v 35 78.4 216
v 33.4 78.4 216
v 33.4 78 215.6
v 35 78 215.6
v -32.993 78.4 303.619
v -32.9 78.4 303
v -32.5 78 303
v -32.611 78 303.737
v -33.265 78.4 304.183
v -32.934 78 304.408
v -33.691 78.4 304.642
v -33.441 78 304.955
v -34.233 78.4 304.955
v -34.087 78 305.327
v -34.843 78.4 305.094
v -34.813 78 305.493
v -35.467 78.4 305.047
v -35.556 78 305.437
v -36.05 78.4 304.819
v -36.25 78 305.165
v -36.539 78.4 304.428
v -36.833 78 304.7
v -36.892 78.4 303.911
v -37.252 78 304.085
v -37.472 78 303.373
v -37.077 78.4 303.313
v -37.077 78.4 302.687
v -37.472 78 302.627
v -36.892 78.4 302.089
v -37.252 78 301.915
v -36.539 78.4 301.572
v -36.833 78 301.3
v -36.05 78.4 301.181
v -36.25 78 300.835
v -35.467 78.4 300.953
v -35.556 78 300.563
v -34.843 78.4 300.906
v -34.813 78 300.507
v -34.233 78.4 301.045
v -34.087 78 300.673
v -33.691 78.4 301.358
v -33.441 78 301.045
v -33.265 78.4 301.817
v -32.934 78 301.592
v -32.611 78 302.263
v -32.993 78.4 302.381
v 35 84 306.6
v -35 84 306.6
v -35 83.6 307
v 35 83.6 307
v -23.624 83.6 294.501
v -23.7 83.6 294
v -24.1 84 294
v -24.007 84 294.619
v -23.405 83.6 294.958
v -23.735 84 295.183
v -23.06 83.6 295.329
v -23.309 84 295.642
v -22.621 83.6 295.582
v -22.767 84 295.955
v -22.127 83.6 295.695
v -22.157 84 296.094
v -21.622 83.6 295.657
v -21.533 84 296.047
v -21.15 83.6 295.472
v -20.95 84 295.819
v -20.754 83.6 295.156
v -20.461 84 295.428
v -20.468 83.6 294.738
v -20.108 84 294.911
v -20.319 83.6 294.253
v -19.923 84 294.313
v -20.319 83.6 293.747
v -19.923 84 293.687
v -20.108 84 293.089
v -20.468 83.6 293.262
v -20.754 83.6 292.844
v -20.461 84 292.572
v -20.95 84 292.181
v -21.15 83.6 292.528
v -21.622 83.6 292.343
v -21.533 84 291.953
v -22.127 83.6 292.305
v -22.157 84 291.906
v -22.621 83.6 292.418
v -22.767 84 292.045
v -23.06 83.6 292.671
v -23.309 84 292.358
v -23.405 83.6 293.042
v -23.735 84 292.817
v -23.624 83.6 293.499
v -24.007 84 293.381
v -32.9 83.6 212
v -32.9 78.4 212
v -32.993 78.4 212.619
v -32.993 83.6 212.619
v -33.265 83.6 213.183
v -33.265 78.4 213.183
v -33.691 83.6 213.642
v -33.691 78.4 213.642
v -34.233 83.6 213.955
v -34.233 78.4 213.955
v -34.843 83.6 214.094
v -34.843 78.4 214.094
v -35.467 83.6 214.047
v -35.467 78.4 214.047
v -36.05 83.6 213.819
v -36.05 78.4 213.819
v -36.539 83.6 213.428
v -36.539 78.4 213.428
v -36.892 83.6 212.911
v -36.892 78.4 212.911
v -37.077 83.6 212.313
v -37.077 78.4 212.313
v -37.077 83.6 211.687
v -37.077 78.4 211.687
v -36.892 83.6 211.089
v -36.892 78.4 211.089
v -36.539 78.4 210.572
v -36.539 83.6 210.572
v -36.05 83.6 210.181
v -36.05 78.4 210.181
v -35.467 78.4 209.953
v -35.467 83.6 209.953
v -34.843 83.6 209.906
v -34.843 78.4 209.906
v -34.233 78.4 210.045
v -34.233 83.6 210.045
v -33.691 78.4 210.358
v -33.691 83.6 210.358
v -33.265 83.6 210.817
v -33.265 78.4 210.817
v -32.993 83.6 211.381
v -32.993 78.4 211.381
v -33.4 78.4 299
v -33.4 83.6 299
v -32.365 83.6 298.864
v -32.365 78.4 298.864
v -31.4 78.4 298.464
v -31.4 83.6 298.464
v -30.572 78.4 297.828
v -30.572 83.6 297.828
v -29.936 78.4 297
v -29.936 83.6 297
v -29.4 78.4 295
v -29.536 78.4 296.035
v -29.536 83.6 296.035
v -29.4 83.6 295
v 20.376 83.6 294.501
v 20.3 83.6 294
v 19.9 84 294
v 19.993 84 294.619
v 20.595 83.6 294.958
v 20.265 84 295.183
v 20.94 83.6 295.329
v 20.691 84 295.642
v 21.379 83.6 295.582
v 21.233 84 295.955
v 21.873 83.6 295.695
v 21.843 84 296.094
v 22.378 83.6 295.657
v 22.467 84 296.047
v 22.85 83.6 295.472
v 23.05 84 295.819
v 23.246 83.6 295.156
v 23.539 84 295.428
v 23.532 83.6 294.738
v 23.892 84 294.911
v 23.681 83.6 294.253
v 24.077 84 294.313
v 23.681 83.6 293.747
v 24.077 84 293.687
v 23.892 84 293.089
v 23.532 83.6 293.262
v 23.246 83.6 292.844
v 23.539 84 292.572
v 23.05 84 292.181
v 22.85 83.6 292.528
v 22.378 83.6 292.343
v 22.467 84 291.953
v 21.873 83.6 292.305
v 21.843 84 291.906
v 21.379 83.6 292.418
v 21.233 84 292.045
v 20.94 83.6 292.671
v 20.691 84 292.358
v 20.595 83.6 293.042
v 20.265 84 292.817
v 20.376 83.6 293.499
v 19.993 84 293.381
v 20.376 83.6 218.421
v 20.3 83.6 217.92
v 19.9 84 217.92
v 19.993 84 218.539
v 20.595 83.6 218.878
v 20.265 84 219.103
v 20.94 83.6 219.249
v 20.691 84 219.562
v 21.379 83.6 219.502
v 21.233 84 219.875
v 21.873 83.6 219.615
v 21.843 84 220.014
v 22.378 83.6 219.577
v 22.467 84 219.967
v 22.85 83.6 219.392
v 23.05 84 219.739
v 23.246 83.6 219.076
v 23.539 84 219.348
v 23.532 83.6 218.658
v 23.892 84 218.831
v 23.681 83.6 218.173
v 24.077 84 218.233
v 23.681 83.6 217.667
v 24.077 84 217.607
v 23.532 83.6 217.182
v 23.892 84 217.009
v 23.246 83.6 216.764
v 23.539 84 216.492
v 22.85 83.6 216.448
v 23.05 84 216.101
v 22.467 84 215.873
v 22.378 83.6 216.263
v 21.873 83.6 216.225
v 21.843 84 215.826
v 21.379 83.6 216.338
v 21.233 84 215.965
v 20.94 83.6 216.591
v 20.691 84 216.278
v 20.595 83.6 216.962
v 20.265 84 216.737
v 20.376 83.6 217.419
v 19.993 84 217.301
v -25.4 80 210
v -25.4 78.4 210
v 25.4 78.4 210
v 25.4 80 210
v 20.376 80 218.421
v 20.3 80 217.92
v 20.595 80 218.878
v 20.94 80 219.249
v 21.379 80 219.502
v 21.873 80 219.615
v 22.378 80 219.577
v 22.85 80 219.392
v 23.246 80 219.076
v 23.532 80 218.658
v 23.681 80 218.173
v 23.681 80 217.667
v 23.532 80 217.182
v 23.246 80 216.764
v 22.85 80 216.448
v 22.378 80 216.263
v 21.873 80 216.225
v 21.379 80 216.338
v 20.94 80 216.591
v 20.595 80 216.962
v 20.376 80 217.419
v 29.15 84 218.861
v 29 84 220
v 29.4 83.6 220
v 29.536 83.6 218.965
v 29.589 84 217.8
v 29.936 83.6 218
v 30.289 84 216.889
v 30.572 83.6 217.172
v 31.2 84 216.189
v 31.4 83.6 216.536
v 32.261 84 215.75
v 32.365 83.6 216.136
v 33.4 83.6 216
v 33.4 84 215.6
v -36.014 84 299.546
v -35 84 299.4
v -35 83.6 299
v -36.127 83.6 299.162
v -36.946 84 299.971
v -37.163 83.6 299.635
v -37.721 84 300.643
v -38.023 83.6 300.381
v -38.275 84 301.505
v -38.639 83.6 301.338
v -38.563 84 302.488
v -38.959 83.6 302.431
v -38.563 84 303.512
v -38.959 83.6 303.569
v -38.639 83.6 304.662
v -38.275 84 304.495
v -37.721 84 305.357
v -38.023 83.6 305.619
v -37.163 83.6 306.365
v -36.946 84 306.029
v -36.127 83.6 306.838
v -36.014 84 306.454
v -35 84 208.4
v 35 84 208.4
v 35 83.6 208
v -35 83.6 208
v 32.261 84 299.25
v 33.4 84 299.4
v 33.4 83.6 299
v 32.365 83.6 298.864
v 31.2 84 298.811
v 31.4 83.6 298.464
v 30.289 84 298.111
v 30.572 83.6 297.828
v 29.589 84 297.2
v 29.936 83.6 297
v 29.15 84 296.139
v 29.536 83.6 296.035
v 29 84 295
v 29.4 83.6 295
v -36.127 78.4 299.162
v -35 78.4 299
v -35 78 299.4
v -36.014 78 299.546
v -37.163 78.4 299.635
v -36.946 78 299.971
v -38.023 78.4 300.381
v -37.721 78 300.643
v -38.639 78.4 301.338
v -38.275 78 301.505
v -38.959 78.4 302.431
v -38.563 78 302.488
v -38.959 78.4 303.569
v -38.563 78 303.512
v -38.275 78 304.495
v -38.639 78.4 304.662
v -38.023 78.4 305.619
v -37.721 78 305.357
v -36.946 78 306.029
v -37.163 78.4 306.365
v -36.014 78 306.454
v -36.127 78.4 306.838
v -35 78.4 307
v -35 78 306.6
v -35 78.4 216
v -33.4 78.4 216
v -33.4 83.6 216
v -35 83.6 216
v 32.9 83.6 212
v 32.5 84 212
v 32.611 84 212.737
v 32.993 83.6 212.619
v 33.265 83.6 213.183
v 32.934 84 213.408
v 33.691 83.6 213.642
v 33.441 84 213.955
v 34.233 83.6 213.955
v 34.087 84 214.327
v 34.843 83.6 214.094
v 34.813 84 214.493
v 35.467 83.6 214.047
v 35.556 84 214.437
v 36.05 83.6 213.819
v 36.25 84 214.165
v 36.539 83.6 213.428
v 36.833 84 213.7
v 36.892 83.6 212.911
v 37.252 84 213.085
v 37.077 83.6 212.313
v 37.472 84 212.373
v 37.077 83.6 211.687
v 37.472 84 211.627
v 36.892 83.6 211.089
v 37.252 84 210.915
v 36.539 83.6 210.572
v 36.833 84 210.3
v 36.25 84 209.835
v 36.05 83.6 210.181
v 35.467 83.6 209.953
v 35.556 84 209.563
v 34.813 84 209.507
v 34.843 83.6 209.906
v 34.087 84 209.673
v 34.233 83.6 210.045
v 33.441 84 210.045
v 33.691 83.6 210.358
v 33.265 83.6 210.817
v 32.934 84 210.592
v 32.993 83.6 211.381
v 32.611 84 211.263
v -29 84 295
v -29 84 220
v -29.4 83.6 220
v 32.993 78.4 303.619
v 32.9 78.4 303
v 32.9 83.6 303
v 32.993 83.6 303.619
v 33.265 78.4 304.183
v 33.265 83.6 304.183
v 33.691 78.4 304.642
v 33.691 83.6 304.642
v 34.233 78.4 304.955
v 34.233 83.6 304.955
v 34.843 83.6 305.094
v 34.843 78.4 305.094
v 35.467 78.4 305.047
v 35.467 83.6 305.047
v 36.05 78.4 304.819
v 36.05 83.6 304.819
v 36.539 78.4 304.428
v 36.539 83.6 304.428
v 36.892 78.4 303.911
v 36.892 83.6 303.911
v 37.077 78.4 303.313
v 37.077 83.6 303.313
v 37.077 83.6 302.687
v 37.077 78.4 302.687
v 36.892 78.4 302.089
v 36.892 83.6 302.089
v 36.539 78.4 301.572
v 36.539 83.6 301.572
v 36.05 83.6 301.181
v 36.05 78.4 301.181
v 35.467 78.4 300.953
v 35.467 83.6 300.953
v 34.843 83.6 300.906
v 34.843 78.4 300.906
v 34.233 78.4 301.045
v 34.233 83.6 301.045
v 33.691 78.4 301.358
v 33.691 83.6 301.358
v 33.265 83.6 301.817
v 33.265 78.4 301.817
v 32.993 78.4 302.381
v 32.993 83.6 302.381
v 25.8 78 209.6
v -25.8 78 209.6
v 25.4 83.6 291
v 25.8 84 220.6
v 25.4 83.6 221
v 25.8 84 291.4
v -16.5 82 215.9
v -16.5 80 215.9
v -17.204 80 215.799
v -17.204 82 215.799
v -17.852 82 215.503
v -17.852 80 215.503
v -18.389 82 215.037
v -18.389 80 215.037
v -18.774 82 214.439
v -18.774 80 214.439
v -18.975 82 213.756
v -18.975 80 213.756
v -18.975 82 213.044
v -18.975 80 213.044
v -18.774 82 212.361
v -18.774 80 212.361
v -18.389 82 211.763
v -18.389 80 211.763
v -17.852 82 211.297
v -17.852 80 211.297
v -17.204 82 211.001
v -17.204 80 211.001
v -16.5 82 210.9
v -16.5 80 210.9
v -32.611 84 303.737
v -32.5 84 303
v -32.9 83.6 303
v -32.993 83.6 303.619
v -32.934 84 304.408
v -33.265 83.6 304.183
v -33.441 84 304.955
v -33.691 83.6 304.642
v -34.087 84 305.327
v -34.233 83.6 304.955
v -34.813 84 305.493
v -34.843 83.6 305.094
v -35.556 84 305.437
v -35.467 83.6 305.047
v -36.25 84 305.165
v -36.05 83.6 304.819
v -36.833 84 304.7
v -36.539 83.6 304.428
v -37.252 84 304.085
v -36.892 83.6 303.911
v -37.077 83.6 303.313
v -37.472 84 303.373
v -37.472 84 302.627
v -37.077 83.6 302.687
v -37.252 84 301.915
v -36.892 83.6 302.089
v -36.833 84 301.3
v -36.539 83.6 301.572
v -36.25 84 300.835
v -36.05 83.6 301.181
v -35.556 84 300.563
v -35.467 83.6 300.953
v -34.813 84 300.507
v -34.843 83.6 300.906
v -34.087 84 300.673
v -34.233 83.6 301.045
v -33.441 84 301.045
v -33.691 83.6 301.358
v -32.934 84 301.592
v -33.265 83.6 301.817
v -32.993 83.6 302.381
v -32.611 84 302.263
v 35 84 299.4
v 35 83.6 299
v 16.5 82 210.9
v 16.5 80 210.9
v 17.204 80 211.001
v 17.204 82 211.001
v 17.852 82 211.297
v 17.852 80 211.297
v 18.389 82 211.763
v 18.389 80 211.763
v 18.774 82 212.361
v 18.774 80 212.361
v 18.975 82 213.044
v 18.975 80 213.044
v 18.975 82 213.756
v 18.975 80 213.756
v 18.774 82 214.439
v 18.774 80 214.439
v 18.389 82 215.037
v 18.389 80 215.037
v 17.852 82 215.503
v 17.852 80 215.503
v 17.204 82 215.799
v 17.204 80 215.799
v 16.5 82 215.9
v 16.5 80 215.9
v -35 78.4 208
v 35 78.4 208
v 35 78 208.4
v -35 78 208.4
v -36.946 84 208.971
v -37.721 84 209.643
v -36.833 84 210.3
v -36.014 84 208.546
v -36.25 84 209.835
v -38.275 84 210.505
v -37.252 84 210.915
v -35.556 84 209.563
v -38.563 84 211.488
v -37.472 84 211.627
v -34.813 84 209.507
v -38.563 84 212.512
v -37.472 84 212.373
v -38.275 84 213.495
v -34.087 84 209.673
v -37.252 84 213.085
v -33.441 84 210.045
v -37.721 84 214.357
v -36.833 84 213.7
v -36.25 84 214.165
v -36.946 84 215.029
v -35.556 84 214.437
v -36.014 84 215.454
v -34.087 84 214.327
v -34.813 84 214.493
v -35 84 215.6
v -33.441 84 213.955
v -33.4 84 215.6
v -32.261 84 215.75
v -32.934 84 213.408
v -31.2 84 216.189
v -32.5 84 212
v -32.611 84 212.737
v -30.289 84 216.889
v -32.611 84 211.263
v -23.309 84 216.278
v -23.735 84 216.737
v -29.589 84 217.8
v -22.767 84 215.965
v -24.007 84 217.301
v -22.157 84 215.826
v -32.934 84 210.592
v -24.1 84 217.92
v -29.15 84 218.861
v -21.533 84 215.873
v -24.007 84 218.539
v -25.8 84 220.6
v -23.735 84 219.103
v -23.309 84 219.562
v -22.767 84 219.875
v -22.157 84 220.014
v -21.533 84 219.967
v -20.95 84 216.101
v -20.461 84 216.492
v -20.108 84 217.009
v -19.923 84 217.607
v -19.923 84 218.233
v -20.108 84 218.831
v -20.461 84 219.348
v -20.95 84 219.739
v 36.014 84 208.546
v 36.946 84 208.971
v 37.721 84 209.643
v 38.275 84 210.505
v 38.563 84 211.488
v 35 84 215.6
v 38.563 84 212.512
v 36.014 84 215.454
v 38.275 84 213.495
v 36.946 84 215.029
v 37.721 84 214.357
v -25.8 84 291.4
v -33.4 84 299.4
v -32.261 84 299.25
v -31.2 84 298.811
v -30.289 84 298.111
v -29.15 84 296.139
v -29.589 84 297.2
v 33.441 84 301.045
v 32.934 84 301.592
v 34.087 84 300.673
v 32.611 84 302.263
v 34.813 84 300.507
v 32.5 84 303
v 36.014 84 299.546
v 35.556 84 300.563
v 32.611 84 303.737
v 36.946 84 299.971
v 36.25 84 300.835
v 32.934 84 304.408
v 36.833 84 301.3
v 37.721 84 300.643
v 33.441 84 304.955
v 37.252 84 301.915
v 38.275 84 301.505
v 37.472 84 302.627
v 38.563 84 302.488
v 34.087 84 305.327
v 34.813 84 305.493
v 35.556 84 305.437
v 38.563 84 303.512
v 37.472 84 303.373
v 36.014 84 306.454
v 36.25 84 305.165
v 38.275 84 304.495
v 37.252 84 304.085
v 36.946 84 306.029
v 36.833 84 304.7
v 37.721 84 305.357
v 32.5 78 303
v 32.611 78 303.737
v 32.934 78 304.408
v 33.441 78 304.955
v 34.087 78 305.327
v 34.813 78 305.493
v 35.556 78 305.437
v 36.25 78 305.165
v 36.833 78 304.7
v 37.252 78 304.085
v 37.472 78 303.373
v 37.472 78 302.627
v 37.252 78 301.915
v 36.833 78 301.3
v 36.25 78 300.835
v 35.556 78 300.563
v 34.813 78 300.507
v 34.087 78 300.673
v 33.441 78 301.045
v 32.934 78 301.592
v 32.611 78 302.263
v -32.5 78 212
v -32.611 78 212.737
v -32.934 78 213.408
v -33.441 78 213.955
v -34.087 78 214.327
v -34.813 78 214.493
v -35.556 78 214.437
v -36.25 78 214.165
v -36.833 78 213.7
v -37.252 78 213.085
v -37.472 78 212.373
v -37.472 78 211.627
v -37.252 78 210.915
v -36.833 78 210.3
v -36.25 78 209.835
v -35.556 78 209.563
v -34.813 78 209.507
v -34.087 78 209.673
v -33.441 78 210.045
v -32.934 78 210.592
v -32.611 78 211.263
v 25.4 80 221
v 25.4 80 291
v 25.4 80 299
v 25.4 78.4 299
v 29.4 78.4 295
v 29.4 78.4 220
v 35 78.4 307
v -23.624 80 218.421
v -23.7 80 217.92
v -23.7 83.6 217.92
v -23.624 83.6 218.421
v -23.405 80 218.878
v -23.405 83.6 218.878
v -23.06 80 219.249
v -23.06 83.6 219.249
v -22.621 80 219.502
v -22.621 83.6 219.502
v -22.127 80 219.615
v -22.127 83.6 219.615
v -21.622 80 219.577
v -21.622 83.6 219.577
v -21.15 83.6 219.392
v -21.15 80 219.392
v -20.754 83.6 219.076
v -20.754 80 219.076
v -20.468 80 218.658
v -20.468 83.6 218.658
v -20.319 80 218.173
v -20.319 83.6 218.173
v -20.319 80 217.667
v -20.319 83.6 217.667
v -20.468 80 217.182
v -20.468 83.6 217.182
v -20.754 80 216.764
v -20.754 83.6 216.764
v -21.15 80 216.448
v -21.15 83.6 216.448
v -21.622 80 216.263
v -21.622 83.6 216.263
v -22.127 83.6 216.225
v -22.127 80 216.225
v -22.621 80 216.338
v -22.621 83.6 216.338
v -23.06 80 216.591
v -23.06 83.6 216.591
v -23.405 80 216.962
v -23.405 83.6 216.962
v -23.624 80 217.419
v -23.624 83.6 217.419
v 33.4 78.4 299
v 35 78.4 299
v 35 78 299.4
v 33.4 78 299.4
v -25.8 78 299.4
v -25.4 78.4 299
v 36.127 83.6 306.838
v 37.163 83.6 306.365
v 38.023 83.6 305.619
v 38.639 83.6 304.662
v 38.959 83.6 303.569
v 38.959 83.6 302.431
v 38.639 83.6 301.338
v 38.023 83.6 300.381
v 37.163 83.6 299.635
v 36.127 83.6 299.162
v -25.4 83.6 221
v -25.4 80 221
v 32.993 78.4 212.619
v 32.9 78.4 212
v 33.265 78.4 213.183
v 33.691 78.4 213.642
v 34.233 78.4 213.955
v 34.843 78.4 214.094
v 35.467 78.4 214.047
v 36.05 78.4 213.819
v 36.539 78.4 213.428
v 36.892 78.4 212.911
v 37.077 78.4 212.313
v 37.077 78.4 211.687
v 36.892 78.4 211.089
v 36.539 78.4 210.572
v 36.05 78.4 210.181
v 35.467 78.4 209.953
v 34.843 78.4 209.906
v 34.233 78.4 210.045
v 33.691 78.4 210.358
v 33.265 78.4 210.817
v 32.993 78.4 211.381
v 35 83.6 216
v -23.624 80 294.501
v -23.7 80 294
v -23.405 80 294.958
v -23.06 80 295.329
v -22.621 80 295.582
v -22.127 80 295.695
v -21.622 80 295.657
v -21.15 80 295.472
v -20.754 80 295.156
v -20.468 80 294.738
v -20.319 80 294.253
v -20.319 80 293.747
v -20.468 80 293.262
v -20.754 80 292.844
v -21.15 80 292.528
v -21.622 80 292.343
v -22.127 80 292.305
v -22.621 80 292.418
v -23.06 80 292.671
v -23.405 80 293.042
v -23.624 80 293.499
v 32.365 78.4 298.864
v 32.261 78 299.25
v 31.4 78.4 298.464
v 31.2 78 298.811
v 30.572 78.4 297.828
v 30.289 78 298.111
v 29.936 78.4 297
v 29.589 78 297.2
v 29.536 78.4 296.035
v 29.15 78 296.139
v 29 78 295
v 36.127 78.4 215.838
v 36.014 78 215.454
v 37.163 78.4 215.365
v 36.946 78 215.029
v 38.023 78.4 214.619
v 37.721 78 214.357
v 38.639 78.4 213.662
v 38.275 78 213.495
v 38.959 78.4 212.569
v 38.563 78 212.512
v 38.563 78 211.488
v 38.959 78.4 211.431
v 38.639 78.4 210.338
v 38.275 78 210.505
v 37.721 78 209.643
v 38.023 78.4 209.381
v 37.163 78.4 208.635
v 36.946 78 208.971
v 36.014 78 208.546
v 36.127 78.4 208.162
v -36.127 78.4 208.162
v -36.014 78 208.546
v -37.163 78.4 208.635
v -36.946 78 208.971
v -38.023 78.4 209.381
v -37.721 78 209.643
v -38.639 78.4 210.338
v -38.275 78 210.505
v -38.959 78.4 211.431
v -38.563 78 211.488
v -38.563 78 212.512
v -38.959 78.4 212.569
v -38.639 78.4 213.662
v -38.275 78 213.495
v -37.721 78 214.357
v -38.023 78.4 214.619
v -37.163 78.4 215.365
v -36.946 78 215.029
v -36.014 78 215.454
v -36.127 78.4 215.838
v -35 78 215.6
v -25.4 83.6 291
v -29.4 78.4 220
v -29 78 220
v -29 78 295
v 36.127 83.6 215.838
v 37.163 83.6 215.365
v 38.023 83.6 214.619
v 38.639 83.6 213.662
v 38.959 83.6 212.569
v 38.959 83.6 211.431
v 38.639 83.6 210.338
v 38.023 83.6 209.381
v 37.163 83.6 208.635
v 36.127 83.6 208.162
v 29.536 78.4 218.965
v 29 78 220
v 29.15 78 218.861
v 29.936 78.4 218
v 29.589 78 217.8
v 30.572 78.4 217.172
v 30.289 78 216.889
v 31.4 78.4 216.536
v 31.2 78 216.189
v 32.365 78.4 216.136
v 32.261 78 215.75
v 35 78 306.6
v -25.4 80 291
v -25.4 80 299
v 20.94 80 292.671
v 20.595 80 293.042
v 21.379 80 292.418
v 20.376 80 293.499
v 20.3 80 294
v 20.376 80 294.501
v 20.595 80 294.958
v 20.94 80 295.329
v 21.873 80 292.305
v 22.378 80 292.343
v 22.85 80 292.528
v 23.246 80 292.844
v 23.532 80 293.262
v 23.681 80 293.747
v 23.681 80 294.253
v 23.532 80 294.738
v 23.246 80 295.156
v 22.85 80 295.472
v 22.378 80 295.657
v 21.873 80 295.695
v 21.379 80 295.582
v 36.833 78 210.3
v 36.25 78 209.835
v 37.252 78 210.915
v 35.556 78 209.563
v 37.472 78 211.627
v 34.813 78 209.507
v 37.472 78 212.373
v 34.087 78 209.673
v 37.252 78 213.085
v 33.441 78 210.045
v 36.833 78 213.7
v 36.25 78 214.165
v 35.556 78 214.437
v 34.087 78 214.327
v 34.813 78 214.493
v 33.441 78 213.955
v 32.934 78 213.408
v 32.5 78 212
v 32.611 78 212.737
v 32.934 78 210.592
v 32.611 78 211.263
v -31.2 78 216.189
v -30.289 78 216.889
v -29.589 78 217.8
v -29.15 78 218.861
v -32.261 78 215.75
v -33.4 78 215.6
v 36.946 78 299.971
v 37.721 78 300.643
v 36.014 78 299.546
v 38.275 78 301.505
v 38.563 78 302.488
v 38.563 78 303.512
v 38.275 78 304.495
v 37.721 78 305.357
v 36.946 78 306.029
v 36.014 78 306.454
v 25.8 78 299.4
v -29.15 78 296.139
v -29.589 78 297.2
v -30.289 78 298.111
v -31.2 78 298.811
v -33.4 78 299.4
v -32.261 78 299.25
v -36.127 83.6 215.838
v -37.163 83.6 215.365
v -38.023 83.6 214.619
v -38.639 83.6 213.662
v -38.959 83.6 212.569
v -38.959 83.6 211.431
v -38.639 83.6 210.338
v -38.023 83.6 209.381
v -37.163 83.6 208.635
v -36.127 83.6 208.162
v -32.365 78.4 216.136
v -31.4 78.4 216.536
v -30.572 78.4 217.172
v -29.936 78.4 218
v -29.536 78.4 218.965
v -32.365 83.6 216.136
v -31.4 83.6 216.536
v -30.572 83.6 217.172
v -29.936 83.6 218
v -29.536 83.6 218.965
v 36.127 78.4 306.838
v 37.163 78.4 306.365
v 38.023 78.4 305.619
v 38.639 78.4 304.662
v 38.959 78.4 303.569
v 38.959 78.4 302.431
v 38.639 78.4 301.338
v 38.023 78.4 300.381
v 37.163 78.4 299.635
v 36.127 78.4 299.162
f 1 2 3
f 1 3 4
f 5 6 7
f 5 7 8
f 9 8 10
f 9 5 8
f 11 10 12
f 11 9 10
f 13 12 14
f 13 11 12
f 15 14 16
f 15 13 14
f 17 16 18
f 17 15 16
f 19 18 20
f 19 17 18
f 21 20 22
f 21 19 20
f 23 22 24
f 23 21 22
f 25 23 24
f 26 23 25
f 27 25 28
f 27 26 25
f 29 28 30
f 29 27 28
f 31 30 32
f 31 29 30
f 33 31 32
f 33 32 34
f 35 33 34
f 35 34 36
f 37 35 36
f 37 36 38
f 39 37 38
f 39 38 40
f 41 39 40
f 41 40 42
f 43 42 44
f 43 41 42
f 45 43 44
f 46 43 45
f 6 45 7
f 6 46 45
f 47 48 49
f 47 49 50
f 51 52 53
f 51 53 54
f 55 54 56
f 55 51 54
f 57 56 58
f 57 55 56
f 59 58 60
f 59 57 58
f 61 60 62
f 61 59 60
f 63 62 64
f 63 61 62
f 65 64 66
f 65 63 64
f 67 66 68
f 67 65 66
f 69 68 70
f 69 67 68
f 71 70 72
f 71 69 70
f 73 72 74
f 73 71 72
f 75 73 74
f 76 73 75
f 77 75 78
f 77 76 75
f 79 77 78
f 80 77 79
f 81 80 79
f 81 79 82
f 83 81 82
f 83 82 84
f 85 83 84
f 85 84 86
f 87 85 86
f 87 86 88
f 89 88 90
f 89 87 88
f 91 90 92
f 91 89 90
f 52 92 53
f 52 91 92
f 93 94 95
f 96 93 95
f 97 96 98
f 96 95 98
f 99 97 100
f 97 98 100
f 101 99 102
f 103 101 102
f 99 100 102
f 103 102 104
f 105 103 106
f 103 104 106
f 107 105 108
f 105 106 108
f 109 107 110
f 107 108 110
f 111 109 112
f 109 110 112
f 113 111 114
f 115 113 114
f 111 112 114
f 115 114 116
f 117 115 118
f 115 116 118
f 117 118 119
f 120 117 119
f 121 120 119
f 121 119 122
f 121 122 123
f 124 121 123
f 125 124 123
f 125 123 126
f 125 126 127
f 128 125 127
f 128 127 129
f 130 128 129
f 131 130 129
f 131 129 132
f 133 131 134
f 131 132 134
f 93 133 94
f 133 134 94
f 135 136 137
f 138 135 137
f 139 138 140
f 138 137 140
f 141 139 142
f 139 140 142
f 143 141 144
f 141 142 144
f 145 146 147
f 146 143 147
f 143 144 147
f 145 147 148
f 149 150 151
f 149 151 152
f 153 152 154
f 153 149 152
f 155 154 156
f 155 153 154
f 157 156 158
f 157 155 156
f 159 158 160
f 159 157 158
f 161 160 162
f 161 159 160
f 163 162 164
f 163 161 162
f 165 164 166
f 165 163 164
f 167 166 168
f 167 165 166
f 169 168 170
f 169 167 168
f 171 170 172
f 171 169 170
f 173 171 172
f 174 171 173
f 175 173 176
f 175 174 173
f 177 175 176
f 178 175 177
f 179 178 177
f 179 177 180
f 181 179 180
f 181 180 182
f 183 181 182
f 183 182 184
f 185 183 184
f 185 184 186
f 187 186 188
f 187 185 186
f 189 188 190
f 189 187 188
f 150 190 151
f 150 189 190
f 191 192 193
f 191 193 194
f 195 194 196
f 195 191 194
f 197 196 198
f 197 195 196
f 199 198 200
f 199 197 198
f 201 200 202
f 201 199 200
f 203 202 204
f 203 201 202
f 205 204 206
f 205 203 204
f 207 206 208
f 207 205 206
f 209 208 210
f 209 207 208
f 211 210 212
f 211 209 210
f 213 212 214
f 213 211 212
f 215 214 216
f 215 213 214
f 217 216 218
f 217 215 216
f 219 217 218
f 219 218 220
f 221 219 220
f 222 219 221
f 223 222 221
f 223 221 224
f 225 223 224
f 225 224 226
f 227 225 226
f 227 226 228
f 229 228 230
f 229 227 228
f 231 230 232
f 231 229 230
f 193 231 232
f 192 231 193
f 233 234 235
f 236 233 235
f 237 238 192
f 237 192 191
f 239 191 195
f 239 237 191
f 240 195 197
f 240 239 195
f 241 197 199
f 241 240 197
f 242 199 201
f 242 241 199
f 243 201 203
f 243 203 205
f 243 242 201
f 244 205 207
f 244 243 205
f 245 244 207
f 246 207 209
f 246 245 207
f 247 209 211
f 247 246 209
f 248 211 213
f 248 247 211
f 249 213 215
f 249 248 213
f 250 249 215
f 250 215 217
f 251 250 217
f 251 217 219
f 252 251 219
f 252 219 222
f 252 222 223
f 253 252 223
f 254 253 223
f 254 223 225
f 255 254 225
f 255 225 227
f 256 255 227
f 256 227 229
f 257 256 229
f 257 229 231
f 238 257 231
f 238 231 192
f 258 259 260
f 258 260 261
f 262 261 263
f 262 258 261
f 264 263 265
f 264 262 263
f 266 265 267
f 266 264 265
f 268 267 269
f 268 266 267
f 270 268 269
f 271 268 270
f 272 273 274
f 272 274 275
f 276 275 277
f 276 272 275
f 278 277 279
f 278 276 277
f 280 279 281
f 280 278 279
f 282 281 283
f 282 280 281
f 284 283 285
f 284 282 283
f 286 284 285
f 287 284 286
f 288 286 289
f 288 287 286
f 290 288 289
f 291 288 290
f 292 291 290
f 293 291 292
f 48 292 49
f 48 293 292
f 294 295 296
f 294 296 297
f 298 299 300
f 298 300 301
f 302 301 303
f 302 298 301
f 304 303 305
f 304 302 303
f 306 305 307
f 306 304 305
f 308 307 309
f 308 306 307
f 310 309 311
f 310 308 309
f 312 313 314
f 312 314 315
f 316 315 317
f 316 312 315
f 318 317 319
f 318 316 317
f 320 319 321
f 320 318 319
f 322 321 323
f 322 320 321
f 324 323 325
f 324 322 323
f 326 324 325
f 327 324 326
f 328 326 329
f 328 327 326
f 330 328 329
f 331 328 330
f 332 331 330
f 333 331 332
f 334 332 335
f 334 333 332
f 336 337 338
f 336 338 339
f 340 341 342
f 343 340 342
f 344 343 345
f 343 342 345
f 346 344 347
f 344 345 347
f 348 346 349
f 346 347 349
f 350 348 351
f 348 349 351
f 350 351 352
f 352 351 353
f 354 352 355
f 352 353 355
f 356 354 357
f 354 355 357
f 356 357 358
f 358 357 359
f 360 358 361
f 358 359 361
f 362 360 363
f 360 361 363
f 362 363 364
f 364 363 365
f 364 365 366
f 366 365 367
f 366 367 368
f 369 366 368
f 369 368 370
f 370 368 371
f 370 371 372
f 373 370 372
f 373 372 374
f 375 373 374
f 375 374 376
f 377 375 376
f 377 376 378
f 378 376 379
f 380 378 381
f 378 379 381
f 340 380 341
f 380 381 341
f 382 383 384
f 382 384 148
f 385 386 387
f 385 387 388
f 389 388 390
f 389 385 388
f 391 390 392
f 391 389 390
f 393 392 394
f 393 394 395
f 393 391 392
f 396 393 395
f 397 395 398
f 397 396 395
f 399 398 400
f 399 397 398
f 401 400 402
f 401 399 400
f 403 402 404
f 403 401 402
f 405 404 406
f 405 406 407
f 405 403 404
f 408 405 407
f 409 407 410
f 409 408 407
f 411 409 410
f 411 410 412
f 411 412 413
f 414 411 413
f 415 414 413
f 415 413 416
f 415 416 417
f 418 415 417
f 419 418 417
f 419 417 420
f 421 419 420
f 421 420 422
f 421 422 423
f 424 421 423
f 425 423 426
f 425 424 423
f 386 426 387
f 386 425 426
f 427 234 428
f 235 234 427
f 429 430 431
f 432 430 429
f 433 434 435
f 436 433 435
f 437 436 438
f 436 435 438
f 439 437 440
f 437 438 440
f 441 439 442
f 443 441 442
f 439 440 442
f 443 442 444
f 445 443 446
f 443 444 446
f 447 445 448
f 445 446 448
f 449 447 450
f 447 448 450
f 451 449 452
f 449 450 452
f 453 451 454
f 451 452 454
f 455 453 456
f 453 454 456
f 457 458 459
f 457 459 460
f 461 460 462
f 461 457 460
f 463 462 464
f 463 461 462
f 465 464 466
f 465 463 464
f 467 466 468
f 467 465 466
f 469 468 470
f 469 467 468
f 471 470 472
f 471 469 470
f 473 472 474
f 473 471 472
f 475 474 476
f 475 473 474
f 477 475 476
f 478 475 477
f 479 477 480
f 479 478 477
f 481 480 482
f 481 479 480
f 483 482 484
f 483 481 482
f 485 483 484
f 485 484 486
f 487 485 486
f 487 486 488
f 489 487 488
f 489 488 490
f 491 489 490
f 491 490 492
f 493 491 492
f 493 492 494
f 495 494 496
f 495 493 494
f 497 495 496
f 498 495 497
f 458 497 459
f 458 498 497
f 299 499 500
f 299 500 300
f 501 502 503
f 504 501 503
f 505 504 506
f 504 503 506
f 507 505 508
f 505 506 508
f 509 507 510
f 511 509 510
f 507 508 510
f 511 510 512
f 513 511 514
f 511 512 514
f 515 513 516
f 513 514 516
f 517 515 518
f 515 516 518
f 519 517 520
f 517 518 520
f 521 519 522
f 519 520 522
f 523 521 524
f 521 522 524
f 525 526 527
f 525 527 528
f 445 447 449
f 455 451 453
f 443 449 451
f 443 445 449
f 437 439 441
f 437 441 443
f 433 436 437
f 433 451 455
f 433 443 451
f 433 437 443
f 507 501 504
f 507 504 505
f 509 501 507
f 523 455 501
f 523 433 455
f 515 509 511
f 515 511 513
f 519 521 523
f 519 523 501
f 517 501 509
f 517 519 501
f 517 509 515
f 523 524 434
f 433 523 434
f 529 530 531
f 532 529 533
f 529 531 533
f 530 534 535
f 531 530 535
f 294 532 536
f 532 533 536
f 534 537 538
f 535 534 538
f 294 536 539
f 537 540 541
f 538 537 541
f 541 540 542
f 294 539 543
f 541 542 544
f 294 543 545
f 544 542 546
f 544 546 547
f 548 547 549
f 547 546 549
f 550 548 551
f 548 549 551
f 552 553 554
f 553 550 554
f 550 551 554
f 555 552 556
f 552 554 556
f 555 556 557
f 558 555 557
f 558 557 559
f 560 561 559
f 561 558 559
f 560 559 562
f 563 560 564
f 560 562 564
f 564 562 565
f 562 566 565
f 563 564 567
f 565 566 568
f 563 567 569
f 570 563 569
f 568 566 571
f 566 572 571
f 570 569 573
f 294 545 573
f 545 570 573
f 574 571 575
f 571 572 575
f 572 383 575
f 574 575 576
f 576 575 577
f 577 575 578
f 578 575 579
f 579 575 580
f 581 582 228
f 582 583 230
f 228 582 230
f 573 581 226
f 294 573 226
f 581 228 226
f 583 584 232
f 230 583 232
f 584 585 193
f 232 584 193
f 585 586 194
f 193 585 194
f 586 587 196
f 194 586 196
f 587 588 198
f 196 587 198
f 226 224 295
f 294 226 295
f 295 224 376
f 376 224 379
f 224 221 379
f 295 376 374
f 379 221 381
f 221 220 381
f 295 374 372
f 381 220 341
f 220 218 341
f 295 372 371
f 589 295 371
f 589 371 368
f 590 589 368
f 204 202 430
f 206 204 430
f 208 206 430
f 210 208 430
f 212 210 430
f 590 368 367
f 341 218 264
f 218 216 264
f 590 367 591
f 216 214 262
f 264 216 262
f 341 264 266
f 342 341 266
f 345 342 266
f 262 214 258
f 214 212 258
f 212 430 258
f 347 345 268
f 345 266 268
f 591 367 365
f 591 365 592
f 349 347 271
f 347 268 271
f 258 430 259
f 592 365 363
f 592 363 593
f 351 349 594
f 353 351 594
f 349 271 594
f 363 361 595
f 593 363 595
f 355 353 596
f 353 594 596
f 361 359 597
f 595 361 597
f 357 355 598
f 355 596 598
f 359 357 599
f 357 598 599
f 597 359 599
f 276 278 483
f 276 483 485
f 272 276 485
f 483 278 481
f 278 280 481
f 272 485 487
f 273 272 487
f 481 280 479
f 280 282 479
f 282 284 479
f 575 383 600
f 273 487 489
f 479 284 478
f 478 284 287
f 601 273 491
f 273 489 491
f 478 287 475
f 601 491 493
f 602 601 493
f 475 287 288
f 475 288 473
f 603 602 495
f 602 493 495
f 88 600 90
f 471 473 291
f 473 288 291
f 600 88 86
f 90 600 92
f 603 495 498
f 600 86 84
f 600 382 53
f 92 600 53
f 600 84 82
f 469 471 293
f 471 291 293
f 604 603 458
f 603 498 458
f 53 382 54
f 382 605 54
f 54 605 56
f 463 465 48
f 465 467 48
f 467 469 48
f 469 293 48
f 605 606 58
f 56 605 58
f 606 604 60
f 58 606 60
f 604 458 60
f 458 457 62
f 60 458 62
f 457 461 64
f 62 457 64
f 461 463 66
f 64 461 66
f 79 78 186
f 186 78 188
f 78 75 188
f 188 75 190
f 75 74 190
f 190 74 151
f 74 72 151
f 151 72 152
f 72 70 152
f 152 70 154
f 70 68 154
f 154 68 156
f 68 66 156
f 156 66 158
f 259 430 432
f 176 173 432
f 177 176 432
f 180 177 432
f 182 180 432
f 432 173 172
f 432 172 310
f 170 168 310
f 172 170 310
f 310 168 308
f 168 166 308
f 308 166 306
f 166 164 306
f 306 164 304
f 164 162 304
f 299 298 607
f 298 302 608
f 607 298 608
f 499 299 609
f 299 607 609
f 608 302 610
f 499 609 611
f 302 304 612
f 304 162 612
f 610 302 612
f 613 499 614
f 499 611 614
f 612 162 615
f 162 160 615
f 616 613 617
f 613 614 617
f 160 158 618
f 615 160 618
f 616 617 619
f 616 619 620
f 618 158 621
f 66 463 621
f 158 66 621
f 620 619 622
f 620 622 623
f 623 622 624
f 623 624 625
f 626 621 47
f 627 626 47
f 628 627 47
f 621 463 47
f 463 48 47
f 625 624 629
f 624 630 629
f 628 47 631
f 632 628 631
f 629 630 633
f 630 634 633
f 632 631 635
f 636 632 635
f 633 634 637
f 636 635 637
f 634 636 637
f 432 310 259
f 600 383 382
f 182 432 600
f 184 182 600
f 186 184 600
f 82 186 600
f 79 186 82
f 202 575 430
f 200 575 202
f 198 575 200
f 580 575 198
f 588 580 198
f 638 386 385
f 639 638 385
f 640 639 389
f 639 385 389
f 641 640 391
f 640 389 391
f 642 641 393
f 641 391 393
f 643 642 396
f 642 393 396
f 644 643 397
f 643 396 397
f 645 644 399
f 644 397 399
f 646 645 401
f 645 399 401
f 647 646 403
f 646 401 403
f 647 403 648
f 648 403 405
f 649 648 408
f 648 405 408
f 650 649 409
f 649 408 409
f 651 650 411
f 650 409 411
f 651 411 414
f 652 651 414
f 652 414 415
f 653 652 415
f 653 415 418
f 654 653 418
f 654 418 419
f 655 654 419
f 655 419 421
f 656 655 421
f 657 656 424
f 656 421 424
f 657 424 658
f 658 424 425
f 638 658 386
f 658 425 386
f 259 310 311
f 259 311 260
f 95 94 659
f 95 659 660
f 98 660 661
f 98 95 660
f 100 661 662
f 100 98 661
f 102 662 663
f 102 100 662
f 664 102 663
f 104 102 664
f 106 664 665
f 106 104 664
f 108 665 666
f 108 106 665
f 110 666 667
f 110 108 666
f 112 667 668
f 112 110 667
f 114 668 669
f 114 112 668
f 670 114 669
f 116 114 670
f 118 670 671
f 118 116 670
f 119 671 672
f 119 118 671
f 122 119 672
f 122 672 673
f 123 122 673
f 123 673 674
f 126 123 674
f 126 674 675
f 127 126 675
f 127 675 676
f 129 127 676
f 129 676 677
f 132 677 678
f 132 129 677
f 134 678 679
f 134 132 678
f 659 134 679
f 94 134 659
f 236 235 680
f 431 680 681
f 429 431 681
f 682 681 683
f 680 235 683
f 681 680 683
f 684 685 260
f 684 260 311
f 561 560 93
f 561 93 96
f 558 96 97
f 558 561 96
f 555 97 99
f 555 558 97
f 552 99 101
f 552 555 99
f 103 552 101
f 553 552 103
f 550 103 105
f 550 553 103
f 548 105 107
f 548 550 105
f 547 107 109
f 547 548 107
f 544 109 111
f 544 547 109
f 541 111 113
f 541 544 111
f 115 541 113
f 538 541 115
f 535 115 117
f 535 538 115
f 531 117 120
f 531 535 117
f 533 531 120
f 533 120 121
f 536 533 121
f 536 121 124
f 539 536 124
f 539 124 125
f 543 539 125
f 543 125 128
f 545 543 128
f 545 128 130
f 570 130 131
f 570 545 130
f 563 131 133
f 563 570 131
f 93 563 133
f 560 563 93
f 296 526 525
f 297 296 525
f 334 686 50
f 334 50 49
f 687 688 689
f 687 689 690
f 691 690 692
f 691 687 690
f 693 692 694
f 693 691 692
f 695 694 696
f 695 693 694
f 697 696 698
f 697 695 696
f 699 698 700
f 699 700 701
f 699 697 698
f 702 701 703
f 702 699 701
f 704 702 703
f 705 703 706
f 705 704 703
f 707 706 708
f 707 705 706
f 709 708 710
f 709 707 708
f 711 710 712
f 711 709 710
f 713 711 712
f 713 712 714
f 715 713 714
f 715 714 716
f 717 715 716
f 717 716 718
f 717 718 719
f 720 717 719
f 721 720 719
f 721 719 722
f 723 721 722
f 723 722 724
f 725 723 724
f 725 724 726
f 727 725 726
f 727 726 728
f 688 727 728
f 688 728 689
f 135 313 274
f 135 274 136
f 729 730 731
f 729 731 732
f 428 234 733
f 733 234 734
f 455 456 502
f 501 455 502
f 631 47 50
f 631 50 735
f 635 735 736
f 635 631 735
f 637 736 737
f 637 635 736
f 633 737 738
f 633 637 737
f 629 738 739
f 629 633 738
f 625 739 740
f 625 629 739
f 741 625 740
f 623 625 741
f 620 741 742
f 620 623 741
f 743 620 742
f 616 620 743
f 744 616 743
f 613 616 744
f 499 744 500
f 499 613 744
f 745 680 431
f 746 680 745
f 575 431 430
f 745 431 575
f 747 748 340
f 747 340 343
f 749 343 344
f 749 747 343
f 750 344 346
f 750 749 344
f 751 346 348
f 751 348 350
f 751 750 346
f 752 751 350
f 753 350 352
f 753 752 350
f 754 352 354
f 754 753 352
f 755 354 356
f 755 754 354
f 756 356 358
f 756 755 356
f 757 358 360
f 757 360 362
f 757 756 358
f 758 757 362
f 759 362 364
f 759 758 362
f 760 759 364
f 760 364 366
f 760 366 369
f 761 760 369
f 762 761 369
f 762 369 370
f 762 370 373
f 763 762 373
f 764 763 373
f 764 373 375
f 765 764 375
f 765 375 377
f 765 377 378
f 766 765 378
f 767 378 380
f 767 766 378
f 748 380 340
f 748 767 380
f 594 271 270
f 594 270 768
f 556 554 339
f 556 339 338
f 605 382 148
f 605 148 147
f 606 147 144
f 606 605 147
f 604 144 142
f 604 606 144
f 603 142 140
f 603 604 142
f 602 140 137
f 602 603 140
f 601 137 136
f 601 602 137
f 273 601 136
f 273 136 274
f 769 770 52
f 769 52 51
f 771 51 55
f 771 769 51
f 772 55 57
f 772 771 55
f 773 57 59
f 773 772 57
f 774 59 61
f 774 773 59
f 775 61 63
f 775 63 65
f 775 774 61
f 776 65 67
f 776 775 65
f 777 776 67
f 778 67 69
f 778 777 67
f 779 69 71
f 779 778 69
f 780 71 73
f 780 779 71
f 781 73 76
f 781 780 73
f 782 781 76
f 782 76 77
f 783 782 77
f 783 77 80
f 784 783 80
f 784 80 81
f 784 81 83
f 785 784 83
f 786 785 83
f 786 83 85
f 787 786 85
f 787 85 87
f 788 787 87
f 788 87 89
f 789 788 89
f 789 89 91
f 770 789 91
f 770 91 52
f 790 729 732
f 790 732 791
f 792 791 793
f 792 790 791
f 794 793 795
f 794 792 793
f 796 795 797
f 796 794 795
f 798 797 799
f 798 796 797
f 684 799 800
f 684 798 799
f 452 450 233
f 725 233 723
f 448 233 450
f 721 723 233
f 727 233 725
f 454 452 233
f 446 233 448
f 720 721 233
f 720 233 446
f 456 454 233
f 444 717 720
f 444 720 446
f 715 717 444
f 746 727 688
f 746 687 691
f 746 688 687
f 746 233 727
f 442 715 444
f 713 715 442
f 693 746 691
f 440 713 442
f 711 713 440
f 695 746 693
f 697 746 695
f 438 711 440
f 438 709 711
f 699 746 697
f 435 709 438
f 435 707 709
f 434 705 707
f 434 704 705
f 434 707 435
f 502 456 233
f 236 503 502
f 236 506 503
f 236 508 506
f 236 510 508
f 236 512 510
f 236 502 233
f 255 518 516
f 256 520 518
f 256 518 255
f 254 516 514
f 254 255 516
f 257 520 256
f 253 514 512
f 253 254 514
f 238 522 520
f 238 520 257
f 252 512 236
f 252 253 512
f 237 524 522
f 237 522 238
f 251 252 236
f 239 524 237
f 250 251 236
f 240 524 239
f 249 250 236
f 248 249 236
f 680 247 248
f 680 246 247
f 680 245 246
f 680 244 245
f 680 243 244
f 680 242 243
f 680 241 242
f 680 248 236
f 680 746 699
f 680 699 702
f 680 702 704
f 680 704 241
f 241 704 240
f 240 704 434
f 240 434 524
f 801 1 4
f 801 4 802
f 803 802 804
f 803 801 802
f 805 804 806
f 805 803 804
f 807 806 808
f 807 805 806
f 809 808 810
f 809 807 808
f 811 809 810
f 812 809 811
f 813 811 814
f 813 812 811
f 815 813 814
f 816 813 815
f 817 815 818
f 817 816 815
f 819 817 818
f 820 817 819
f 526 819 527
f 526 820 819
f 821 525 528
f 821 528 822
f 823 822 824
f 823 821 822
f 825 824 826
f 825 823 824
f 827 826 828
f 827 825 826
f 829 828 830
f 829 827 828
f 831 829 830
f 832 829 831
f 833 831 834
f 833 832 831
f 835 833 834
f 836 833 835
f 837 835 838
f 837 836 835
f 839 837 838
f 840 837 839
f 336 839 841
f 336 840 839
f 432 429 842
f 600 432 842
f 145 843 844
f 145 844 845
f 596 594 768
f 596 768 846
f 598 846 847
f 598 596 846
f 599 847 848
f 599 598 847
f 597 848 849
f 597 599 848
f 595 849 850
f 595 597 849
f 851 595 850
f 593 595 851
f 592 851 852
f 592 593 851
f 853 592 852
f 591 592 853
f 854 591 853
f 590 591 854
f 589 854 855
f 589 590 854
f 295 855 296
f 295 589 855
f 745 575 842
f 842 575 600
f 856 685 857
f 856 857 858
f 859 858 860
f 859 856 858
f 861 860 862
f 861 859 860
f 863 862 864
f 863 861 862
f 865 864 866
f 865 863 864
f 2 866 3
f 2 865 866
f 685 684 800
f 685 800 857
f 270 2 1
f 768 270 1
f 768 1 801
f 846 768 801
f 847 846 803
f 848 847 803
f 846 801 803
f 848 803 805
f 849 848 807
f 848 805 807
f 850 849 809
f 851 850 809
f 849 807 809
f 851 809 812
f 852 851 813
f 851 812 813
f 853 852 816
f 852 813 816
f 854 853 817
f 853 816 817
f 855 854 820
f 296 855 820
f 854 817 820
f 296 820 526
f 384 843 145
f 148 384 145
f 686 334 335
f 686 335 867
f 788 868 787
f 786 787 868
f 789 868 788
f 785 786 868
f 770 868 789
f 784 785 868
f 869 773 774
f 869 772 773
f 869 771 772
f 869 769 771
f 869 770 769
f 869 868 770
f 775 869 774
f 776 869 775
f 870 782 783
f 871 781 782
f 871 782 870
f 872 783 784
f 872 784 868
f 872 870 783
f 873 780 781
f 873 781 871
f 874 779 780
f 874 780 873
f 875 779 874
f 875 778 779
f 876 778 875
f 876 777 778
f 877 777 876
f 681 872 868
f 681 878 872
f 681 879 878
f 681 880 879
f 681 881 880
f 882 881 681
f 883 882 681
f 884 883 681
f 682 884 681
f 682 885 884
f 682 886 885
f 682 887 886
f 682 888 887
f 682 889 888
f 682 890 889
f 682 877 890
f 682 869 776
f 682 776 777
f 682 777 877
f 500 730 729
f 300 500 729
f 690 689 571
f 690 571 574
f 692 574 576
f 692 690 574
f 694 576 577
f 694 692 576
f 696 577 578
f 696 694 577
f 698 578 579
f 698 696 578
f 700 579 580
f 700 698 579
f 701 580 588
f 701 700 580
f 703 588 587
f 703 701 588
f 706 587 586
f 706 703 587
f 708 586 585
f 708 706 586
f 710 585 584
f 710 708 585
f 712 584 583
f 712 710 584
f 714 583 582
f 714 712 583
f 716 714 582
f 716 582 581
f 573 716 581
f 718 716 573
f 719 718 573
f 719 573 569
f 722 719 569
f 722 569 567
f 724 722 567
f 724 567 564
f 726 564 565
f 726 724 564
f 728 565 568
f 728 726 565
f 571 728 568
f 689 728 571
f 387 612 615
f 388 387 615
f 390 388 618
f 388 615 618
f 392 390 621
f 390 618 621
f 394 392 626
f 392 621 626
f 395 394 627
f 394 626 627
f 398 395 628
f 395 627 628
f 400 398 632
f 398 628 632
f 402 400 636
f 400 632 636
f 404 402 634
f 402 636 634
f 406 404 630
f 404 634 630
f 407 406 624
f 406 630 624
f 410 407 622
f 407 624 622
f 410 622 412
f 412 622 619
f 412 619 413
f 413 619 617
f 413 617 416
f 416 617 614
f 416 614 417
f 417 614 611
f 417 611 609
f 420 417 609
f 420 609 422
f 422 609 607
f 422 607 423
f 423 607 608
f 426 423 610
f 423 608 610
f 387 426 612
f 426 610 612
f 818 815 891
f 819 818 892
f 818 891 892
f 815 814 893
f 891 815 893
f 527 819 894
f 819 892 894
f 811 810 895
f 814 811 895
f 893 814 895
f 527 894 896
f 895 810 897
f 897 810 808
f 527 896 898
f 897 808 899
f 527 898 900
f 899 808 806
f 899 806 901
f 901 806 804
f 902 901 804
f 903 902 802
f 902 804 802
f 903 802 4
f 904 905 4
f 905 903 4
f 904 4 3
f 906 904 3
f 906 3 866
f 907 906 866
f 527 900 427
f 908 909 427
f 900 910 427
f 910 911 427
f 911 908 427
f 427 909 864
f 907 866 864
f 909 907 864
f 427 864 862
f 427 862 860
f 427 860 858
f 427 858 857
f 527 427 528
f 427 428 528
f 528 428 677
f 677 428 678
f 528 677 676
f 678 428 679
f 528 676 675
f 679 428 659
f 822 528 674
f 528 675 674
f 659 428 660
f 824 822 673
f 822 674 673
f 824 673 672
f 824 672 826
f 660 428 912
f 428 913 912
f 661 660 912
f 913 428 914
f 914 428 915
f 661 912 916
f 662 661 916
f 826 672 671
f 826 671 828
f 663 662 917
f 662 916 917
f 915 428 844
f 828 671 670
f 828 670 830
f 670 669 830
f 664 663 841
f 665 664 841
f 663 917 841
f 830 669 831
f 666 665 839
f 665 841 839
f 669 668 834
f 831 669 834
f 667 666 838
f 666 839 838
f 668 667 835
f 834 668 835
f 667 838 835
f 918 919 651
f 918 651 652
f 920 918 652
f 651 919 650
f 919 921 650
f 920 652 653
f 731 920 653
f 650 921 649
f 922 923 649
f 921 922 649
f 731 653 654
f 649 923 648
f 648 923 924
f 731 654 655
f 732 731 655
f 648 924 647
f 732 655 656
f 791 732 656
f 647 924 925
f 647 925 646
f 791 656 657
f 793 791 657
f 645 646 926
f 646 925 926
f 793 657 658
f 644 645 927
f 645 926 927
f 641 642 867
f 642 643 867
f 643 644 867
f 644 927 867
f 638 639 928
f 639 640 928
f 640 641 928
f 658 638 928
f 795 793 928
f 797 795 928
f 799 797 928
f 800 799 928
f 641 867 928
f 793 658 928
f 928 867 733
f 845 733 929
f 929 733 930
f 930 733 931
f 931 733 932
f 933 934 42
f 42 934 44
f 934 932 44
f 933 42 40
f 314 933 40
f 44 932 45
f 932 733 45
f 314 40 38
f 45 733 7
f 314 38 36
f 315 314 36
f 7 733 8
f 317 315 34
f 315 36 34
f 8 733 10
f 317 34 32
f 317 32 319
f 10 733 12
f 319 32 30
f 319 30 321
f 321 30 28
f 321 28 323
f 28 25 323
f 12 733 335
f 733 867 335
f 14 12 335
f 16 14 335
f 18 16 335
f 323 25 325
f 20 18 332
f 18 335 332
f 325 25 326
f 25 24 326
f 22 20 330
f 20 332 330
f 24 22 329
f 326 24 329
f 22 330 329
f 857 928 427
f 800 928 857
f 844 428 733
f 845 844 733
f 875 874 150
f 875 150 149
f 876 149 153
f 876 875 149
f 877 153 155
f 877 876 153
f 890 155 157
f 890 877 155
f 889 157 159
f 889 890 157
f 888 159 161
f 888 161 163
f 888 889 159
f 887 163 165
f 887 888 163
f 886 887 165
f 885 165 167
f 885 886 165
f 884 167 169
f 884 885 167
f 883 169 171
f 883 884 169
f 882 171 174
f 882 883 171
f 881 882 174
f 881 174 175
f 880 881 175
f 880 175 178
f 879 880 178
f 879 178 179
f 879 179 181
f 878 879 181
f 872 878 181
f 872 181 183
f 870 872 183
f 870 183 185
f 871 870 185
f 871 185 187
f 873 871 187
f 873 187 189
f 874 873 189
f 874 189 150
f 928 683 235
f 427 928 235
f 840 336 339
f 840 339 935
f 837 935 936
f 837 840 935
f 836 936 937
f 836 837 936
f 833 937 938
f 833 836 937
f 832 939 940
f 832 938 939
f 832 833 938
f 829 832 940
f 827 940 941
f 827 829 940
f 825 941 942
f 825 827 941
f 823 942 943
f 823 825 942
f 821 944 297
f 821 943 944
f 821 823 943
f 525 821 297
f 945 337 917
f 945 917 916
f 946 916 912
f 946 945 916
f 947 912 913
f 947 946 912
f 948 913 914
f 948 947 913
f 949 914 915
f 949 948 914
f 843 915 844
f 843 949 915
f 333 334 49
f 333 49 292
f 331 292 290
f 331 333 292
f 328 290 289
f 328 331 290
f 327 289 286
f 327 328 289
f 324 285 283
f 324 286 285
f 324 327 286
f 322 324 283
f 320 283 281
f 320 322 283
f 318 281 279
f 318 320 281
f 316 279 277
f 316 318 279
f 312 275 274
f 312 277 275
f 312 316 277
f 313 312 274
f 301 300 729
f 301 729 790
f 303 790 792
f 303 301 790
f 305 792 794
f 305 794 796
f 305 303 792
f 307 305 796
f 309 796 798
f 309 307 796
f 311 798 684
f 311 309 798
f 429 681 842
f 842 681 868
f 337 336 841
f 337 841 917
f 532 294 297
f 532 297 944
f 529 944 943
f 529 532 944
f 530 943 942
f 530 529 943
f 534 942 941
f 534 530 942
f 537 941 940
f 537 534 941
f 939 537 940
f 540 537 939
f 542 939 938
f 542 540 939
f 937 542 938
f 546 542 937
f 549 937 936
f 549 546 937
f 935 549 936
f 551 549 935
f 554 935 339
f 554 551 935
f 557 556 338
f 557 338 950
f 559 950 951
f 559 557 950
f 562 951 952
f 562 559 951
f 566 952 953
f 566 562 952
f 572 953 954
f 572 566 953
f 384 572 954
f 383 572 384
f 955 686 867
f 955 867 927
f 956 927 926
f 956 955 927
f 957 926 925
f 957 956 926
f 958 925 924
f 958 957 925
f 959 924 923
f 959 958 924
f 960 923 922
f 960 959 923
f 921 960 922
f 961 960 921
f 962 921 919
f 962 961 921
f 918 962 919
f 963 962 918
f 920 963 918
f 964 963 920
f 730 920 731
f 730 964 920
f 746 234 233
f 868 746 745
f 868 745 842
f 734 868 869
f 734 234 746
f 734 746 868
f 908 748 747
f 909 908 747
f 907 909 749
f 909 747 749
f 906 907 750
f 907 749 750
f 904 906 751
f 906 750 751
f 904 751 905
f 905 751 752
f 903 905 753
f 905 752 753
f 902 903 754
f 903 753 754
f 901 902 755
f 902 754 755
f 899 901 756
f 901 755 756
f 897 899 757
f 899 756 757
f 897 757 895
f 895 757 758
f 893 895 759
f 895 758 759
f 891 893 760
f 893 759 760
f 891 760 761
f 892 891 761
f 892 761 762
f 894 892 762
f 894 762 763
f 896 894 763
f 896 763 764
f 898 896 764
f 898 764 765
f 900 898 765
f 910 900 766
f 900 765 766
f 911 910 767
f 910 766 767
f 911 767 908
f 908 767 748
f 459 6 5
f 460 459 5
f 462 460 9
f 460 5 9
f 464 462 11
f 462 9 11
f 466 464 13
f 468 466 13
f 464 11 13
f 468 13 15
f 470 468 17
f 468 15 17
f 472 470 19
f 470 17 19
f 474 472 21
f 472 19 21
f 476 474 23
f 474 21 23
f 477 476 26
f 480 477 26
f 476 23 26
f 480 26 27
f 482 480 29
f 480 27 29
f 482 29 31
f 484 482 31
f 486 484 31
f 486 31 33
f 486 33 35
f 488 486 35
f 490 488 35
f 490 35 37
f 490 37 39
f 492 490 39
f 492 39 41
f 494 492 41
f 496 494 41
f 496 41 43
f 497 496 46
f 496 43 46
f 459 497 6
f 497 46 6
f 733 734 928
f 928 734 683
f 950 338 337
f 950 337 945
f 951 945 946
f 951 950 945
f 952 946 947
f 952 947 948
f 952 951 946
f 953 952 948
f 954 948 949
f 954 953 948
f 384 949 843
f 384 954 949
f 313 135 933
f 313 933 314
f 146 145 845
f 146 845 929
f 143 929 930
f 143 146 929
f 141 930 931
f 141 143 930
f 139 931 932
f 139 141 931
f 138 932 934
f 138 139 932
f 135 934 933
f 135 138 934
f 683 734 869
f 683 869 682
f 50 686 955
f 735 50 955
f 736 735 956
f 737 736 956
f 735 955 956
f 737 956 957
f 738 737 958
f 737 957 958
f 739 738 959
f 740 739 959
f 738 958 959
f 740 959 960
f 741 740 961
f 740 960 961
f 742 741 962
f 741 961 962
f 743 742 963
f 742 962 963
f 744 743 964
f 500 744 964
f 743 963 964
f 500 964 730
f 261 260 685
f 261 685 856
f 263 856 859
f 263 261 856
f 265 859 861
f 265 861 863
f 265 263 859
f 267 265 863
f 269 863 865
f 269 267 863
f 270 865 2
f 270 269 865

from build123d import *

# Parameters (mm, degrees)
SKETCH210_W     = 58.8
SKETCH210_H     = 99
SKETCH210_R     = 1.7
SKETCH210_W_2   = 50.8
SKETCH210_H_2   = 70
PAD109_DEPTH    = 6
SKETCH211_R     = 2.1
PAD110_DEPTH    = 6
SKETCH212_W     = 50.8
SKETCH212_H     = 89
POCKET044_DEPTH = 2
POCKET045_DEPTH = 2
FILLET_R        = 4
CHAMFER074_SIZE = 0.4


with BuildPart() as part:
    # Sketch210 (on Binder) → Pad109 (new body)
    with BuildSketch(Plane(origin=(0, 78, 0), x_dir=(-1, 0, 0), z_dir=(0, 1, 0))):
        with Locations((0, 257.5)):
            Rectangle(SKETCH210_W, SKETCH210_H)
        with Locations((-22, 217.92)):
            Circle(SKETCH210_R, mode=Mode.SUBTRACT)
        with Locations((22, 217.92)):
            Circle(SKETCH210_R, mode=Mode.SUBTRACT)
        with Locations((22, 294)):
            Circle(SKETCH210_R, mode=Mode.SUBTRACT)
        with Locations((-22, 294)):
            Circle(SKETCH210_R, mode=Mode.SUBTRACT)
        with Locations((0, 256)):
            Rectangle(SKETCH210_W_2, SKETCH210_H_2, mode=Mode.SUBTRACT)
    extrude(amount=PAD109_DEPTH)

    # Sketch211 (on Face13 of Pad109) → Pad110 (join)
    with BuildSketch(Plane.XZ.offset(-78)):
        with BuildLine():
            ThreePointArc((-29.4, 299), (-25.4, 303), (-29.4, 307))
            Line((-29.4, 307), (-35, 307))
            ThreePointArc((-35, 307), (-39, 303), (-35, 299))
            Line((-35, 299), (-29.4, 299))
        make_face()
        with Locations((-35, 303)):
            Circle(SKETCH211_R, mode=Mode.SUBTRACT)
        with BuildLine():
            ThreePointArc((-29.4, 208), (-25.4, 212), (-29.4, 216))
            Line((-29.4, 216), (-35, 216))
            ThreePointArc((-35, 216), (-39, 212), (-35, 208))
            Line((-35, 208), (-29.4, 208))
        make_face()
        with Locations((-35, 212)):
            Circle(SKETCH211_R, mode=Mode.SUBTRACT)
    pad110 = extrude(amount=-PAD110_DEPTH)

    # Mirrored: Pad110 across YZ
    add(pad110.mirror(Plane.YZ))

    # Sketch212 (on Face6 of Mirrored) → Pocket044 (cut)
    with BuildSketch(Plane.XZ.offset(-78)):
        with Locations((0, 254.5)):
            Rectangle(SKETCH212_W, SKETCH212_H)
    extrude(amount=-POCKET044_DEPTH, mode=Mode.SUBTRACT)

    # Sketch213 (on Face28 of Pocket044) → Pocket045 (cut)
    with BuildSketch(Plane.XZ.offset(-80)):
        with BuildLine():
            ThreePointArc((-16.5, 215.9), (-19, 213.4), (-16.5, 210.9))
            Line((-16.5, 210.9), (16.5, 210.9))
            ThreePointArc((16.5, 210.9), (19, 213.4), (16.5, 215.9))
            Line((16.5, 215.9), (-16.5, 215.9))
        make_face()
    extrude(amount=-POCKET045_DEPTH, mode=Mode.SUBTRACT)

    # Fillet
    fillet_edges = [part.edges().sort_by_distance(p)[0] for p in [
        (-29.4, 81, 216),
        (-29.4, 81, 299),
        (29.4, 81, 299),
        (29.4, 81, 216),
    ]]
    fillet(fillet_edges, radius=FILLET_R)

    # Chamfer074
    chamfer074_edges = [part.edges().sort_by_distance(p)[0] for p in [
        (34.2, 84, 216),
        (30.571573, 84, 217.171573),
        (39, 84, 212),
        (29.4, 84, 257.5),
        (0, 84, 208),
        (30.571573, 84, 297.828427),
        (-39, 84, 212),
        (34.2, 84, 299),
        (-34.2, 84, 216),
        (39, 84, 303),
        (-30.571573, 84, 217.171573),
        (0, 84, 307),
        (-29.4, 84, 257.5),
        (-39, 84, 303),
        (-30.571573, 84, 297.828427),
        (-34.2, 84, 299),
        (0, 84, 291),
        (-25.4, 84, 256),
        (0, 84, 221),
        (25.4, 84, 256),
        (-37.1, 84, 212),
        (-37.1, 84, 303),
        (37.1, 84, 212),
        (37.1, 84, 303),
        (-20.3, 84, 294),
        (23.7, 84, 294),
        (-20.3, 84, 217.92),
        (23.7, 84, 217.92),
        (34.2, 78, 216),
        (30.571573, 78, 217.171573),
        (39, 78, 212),
        (29.4, 78, 257.5),
        (0, 78, 208),
        (30.571573, 78, 297.828427),
        (-39, 78, 212),
        (34.2, 78, 299),
        (-34.2, 78, 216),
        (39, 78, 303),
        (-30.571573, 78, 217.171573),
        (0, 78, 307),
        (-29.4, 78, 257.5),
        (-39, 78, 303),
        (-30.571573, 78, 297.828427),
        (-34.2, 78, 299),
        (-37.1, 78, 303),
        (-37.1, 78, 212),
        (37.1, 78, 303),
        (25.4, 78, 254.5),
        (0, 78, 299),
        (-25.4, 78, 254.5),
        (0, 78, 210),
        (37.1, 78, 212),
    ]]
    chamfer(chamfer074_edges, length=CHAMFER074_SIZE)


solid = part.part
